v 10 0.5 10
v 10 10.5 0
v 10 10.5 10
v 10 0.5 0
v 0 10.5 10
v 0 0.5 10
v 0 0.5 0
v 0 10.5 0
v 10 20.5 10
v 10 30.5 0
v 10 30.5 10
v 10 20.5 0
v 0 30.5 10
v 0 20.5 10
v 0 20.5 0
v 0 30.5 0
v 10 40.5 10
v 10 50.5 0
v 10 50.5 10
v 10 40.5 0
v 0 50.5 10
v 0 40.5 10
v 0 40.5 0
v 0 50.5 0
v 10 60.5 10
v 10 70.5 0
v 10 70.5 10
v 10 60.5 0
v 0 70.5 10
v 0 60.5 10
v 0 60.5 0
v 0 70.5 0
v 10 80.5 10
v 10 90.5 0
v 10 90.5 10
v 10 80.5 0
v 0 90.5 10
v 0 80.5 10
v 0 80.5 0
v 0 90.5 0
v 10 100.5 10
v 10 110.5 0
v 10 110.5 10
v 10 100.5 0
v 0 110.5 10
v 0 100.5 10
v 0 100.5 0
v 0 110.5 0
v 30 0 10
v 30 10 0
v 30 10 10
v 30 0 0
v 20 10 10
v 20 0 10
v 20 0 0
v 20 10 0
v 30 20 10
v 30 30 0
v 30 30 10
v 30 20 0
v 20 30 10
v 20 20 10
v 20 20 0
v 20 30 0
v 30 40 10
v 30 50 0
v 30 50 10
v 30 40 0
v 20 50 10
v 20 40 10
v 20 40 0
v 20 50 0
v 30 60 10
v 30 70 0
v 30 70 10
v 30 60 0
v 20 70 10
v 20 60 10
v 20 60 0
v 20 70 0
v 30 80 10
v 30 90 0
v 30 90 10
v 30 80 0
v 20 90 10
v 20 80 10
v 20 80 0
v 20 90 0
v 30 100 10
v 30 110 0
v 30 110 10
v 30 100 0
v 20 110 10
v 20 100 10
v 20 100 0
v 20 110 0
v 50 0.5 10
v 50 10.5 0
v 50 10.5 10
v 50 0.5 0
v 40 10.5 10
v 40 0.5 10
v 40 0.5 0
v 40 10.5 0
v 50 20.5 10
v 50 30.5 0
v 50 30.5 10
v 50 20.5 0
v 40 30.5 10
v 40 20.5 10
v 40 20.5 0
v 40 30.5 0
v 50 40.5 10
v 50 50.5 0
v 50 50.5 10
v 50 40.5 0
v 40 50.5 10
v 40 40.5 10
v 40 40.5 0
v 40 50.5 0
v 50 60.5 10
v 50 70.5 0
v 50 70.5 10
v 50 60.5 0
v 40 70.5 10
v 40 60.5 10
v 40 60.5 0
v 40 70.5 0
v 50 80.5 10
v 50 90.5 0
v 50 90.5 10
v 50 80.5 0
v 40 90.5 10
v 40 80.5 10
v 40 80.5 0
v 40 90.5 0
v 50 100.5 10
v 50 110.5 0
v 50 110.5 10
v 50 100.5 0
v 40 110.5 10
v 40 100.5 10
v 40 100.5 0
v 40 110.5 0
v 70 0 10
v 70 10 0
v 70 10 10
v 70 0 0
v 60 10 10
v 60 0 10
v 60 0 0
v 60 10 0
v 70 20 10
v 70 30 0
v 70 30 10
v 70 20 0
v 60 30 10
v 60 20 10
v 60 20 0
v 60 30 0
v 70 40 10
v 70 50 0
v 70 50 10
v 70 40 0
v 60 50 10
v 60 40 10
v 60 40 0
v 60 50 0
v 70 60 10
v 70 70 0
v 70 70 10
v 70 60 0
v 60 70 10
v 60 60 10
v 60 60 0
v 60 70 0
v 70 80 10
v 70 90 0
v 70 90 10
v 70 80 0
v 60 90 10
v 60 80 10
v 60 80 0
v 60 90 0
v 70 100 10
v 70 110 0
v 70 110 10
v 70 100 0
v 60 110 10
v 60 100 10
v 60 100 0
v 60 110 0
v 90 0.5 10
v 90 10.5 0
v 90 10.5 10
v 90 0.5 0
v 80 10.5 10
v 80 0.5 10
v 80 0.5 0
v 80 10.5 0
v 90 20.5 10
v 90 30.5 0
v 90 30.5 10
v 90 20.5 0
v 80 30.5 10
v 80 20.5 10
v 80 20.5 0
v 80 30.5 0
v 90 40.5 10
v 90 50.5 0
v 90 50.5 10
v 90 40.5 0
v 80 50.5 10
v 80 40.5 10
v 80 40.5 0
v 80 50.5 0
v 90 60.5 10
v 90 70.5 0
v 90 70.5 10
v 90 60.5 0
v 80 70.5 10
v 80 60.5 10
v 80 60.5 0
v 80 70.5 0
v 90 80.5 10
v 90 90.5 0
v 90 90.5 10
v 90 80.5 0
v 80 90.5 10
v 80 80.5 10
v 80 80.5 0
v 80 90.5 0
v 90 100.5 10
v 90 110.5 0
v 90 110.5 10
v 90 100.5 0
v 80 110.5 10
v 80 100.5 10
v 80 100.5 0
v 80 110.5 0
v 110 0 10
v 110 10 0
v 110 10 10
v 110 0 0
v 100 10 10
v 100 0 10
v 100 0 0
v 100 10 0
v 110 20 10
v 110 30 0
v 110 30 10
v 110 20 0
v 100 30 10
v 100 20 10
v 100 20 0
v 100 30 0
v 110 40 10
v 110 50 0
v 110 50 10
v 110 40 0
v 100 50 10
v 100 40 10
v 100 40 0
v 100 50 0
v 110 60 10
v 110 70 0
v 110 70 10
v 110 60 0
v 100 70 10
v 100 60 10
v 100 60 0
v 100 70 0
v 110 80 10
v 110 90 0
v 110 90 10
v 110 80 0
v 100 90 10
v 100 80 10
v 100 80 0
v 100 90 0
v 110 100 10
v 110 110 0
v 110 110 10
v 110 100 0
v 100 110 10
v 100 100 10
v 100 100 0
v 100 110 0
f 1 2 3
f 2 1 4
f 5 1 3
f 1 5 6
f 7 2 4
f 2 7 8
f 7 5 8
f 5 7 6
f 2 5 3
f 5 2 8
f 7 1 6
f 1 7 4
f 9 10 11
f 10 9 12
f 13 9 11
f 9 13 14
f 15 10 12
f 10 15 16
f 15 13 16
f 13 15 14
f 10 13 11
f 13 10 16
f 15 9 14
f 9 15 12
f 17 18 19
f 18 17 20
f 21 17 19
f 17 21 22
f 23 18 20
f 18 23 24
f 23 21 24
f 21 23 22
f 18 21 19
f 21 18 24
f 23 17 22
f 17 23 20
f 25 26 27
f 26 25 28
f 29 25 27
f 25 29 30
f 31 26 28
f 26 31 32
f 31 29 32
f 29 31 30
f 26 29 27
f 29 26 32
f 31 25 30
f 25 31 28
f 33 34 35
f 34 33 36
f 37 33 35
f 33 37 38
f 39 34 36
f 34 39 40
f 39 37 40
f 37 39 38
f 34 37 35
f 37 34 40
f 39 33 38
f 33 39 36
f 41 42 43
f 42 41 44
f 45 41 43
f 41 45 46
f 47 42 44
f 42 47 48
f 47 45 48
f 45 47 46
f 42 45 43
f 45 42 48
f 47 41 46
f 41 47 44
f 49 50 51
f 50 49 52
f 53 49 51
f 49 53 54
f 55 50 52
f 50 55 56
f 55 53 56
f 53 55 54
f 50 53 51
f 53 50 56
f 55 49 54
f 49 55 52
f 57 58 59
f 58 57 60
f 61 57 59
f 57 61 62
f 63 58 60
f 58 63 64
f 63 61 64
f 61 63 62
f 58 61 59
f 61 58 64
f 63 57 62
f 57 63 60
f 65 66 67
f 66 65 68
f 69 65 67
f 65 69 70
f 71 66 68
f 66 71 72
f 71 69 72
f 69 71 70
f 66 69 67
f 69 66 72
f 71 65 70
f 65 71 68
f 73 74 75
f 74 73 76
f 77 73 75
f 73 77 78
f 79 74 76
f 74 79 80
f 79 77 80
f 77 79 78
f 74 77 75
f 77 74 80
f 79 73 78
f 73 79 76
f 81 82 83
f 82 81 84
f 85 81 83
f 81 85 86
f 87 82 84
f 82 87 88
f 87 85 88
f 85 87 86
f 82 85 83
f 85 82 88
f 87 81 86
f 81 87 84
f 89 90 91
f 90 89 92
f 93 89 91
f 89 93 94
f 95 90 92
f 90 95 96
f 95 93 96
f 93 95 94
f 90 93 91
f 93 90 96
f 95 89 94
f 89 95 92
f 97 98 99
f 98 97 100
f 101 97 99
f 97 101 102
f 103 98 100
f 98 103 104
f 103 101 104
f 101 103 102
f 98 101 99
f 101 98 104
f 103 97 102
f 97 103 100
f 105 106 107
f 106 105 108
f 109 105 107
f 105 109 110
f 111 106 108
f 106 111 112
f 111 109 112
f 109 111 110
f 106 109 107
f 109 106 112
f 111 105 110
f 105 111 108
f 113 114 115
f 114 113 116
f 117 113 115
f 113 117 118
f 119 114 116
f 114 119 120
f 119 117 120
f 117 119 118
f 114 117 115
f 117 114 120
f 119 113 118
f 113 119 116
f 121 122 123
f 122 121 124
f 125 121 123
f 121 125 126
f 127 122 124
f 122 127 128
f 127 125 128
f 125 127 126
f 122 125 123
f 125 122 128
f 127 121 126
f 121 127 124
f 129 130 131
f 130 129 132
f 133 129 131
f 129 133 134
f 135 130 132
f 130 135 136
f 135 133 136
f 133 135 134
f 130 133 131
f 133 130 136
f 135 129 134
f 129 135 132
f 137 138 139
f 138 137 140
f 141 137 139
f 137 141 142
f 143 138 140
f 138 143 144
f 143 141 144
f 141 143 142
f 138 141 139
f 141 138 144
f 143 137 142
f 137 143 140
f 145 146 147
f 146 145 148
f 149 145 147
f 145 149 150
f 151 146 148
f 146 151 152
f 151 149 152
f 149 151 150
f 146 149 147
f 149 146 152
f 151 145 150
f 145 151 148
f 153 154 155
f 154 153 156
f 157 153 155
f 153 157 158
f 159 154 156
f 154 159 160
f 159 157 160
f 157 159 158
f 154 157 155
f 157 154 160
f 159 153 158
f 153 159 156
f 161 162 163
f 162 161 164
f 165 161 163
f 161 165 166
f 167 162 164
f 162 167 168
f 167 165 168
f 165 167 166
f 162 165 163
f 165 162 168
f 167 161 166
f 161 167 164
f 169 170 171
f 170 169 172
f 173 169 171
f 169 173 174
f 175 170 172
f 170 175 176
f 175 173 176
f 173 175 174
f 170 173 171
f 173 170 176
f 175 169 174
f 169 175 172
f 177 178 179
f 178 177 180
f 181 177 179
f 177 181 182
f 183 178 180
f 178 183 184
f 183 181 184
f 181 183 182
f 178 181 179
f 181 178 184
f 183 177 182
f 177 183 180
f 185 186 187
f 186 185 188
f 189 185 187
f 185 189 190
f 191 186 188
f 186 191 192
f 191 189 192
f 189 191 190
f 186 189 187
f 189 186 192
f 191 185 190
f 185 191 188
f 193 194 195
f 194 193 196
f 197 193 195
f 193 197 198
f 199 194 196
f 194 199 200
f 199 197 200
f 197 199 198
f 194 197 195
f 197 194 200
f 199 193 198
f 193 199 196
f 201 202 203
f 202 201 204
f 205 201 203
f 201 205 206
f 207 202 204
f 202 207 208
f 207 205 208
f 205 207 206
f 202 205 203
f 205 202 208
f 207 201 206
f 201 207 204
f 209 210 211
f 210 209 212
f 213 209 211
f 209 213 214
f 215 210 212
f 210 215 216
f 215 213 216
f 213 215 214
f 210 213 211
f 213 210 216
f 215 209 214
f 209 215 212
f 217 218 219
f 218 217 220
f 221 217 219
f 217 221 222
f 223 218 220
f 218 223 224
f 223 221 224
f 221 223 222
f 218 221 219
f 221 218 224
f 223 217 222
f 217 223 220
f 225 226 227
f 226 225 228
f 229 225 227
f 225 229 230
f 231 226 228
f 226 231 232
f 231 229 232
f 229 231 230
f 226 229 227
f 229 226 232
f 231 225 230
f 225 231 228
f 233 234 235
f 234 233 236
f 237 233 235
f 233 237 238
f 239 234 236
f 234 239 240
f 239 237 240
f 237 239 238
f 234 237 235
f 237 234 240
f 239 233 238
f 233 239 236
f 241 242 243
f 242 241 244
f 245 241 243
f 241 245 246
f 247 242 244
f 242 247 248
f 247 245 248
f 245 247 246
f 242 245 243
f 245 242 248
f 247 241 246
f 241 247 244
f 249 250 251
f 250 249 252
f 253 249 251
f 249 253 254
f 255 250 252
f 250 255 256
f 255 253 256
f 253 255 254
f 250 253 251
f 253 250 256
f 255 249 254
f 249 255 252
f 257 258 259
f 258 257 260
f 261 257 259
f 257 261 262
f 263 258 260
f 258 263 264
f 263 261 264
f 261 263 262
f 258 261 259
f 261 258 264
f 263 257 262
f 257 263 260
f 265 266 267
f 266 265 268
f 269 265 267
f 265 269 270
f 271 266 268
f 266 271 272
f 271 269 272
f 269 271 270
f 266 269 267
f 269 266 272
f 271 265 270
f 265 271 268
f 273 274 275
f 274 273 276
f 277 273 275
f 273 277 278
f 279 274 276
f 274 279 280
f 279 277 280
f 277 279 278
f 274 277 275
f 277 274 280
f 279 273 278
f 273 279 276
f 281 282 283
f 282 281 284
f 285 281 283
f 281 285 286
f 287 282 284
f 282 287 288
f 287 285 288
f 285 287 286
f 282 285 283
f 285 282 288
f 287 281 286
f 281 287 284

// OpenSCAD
for(x = [0:20:100]) {
    for(y = [0:20:100]) {
        translate([x,y,0]) {
            if(x % 40 == 0) {
                translate([0,0.5,0]) {
                    cube([10,10,10]);
                }
            } else {
                cube([10,10,10]);
            }
        }
    }
}
